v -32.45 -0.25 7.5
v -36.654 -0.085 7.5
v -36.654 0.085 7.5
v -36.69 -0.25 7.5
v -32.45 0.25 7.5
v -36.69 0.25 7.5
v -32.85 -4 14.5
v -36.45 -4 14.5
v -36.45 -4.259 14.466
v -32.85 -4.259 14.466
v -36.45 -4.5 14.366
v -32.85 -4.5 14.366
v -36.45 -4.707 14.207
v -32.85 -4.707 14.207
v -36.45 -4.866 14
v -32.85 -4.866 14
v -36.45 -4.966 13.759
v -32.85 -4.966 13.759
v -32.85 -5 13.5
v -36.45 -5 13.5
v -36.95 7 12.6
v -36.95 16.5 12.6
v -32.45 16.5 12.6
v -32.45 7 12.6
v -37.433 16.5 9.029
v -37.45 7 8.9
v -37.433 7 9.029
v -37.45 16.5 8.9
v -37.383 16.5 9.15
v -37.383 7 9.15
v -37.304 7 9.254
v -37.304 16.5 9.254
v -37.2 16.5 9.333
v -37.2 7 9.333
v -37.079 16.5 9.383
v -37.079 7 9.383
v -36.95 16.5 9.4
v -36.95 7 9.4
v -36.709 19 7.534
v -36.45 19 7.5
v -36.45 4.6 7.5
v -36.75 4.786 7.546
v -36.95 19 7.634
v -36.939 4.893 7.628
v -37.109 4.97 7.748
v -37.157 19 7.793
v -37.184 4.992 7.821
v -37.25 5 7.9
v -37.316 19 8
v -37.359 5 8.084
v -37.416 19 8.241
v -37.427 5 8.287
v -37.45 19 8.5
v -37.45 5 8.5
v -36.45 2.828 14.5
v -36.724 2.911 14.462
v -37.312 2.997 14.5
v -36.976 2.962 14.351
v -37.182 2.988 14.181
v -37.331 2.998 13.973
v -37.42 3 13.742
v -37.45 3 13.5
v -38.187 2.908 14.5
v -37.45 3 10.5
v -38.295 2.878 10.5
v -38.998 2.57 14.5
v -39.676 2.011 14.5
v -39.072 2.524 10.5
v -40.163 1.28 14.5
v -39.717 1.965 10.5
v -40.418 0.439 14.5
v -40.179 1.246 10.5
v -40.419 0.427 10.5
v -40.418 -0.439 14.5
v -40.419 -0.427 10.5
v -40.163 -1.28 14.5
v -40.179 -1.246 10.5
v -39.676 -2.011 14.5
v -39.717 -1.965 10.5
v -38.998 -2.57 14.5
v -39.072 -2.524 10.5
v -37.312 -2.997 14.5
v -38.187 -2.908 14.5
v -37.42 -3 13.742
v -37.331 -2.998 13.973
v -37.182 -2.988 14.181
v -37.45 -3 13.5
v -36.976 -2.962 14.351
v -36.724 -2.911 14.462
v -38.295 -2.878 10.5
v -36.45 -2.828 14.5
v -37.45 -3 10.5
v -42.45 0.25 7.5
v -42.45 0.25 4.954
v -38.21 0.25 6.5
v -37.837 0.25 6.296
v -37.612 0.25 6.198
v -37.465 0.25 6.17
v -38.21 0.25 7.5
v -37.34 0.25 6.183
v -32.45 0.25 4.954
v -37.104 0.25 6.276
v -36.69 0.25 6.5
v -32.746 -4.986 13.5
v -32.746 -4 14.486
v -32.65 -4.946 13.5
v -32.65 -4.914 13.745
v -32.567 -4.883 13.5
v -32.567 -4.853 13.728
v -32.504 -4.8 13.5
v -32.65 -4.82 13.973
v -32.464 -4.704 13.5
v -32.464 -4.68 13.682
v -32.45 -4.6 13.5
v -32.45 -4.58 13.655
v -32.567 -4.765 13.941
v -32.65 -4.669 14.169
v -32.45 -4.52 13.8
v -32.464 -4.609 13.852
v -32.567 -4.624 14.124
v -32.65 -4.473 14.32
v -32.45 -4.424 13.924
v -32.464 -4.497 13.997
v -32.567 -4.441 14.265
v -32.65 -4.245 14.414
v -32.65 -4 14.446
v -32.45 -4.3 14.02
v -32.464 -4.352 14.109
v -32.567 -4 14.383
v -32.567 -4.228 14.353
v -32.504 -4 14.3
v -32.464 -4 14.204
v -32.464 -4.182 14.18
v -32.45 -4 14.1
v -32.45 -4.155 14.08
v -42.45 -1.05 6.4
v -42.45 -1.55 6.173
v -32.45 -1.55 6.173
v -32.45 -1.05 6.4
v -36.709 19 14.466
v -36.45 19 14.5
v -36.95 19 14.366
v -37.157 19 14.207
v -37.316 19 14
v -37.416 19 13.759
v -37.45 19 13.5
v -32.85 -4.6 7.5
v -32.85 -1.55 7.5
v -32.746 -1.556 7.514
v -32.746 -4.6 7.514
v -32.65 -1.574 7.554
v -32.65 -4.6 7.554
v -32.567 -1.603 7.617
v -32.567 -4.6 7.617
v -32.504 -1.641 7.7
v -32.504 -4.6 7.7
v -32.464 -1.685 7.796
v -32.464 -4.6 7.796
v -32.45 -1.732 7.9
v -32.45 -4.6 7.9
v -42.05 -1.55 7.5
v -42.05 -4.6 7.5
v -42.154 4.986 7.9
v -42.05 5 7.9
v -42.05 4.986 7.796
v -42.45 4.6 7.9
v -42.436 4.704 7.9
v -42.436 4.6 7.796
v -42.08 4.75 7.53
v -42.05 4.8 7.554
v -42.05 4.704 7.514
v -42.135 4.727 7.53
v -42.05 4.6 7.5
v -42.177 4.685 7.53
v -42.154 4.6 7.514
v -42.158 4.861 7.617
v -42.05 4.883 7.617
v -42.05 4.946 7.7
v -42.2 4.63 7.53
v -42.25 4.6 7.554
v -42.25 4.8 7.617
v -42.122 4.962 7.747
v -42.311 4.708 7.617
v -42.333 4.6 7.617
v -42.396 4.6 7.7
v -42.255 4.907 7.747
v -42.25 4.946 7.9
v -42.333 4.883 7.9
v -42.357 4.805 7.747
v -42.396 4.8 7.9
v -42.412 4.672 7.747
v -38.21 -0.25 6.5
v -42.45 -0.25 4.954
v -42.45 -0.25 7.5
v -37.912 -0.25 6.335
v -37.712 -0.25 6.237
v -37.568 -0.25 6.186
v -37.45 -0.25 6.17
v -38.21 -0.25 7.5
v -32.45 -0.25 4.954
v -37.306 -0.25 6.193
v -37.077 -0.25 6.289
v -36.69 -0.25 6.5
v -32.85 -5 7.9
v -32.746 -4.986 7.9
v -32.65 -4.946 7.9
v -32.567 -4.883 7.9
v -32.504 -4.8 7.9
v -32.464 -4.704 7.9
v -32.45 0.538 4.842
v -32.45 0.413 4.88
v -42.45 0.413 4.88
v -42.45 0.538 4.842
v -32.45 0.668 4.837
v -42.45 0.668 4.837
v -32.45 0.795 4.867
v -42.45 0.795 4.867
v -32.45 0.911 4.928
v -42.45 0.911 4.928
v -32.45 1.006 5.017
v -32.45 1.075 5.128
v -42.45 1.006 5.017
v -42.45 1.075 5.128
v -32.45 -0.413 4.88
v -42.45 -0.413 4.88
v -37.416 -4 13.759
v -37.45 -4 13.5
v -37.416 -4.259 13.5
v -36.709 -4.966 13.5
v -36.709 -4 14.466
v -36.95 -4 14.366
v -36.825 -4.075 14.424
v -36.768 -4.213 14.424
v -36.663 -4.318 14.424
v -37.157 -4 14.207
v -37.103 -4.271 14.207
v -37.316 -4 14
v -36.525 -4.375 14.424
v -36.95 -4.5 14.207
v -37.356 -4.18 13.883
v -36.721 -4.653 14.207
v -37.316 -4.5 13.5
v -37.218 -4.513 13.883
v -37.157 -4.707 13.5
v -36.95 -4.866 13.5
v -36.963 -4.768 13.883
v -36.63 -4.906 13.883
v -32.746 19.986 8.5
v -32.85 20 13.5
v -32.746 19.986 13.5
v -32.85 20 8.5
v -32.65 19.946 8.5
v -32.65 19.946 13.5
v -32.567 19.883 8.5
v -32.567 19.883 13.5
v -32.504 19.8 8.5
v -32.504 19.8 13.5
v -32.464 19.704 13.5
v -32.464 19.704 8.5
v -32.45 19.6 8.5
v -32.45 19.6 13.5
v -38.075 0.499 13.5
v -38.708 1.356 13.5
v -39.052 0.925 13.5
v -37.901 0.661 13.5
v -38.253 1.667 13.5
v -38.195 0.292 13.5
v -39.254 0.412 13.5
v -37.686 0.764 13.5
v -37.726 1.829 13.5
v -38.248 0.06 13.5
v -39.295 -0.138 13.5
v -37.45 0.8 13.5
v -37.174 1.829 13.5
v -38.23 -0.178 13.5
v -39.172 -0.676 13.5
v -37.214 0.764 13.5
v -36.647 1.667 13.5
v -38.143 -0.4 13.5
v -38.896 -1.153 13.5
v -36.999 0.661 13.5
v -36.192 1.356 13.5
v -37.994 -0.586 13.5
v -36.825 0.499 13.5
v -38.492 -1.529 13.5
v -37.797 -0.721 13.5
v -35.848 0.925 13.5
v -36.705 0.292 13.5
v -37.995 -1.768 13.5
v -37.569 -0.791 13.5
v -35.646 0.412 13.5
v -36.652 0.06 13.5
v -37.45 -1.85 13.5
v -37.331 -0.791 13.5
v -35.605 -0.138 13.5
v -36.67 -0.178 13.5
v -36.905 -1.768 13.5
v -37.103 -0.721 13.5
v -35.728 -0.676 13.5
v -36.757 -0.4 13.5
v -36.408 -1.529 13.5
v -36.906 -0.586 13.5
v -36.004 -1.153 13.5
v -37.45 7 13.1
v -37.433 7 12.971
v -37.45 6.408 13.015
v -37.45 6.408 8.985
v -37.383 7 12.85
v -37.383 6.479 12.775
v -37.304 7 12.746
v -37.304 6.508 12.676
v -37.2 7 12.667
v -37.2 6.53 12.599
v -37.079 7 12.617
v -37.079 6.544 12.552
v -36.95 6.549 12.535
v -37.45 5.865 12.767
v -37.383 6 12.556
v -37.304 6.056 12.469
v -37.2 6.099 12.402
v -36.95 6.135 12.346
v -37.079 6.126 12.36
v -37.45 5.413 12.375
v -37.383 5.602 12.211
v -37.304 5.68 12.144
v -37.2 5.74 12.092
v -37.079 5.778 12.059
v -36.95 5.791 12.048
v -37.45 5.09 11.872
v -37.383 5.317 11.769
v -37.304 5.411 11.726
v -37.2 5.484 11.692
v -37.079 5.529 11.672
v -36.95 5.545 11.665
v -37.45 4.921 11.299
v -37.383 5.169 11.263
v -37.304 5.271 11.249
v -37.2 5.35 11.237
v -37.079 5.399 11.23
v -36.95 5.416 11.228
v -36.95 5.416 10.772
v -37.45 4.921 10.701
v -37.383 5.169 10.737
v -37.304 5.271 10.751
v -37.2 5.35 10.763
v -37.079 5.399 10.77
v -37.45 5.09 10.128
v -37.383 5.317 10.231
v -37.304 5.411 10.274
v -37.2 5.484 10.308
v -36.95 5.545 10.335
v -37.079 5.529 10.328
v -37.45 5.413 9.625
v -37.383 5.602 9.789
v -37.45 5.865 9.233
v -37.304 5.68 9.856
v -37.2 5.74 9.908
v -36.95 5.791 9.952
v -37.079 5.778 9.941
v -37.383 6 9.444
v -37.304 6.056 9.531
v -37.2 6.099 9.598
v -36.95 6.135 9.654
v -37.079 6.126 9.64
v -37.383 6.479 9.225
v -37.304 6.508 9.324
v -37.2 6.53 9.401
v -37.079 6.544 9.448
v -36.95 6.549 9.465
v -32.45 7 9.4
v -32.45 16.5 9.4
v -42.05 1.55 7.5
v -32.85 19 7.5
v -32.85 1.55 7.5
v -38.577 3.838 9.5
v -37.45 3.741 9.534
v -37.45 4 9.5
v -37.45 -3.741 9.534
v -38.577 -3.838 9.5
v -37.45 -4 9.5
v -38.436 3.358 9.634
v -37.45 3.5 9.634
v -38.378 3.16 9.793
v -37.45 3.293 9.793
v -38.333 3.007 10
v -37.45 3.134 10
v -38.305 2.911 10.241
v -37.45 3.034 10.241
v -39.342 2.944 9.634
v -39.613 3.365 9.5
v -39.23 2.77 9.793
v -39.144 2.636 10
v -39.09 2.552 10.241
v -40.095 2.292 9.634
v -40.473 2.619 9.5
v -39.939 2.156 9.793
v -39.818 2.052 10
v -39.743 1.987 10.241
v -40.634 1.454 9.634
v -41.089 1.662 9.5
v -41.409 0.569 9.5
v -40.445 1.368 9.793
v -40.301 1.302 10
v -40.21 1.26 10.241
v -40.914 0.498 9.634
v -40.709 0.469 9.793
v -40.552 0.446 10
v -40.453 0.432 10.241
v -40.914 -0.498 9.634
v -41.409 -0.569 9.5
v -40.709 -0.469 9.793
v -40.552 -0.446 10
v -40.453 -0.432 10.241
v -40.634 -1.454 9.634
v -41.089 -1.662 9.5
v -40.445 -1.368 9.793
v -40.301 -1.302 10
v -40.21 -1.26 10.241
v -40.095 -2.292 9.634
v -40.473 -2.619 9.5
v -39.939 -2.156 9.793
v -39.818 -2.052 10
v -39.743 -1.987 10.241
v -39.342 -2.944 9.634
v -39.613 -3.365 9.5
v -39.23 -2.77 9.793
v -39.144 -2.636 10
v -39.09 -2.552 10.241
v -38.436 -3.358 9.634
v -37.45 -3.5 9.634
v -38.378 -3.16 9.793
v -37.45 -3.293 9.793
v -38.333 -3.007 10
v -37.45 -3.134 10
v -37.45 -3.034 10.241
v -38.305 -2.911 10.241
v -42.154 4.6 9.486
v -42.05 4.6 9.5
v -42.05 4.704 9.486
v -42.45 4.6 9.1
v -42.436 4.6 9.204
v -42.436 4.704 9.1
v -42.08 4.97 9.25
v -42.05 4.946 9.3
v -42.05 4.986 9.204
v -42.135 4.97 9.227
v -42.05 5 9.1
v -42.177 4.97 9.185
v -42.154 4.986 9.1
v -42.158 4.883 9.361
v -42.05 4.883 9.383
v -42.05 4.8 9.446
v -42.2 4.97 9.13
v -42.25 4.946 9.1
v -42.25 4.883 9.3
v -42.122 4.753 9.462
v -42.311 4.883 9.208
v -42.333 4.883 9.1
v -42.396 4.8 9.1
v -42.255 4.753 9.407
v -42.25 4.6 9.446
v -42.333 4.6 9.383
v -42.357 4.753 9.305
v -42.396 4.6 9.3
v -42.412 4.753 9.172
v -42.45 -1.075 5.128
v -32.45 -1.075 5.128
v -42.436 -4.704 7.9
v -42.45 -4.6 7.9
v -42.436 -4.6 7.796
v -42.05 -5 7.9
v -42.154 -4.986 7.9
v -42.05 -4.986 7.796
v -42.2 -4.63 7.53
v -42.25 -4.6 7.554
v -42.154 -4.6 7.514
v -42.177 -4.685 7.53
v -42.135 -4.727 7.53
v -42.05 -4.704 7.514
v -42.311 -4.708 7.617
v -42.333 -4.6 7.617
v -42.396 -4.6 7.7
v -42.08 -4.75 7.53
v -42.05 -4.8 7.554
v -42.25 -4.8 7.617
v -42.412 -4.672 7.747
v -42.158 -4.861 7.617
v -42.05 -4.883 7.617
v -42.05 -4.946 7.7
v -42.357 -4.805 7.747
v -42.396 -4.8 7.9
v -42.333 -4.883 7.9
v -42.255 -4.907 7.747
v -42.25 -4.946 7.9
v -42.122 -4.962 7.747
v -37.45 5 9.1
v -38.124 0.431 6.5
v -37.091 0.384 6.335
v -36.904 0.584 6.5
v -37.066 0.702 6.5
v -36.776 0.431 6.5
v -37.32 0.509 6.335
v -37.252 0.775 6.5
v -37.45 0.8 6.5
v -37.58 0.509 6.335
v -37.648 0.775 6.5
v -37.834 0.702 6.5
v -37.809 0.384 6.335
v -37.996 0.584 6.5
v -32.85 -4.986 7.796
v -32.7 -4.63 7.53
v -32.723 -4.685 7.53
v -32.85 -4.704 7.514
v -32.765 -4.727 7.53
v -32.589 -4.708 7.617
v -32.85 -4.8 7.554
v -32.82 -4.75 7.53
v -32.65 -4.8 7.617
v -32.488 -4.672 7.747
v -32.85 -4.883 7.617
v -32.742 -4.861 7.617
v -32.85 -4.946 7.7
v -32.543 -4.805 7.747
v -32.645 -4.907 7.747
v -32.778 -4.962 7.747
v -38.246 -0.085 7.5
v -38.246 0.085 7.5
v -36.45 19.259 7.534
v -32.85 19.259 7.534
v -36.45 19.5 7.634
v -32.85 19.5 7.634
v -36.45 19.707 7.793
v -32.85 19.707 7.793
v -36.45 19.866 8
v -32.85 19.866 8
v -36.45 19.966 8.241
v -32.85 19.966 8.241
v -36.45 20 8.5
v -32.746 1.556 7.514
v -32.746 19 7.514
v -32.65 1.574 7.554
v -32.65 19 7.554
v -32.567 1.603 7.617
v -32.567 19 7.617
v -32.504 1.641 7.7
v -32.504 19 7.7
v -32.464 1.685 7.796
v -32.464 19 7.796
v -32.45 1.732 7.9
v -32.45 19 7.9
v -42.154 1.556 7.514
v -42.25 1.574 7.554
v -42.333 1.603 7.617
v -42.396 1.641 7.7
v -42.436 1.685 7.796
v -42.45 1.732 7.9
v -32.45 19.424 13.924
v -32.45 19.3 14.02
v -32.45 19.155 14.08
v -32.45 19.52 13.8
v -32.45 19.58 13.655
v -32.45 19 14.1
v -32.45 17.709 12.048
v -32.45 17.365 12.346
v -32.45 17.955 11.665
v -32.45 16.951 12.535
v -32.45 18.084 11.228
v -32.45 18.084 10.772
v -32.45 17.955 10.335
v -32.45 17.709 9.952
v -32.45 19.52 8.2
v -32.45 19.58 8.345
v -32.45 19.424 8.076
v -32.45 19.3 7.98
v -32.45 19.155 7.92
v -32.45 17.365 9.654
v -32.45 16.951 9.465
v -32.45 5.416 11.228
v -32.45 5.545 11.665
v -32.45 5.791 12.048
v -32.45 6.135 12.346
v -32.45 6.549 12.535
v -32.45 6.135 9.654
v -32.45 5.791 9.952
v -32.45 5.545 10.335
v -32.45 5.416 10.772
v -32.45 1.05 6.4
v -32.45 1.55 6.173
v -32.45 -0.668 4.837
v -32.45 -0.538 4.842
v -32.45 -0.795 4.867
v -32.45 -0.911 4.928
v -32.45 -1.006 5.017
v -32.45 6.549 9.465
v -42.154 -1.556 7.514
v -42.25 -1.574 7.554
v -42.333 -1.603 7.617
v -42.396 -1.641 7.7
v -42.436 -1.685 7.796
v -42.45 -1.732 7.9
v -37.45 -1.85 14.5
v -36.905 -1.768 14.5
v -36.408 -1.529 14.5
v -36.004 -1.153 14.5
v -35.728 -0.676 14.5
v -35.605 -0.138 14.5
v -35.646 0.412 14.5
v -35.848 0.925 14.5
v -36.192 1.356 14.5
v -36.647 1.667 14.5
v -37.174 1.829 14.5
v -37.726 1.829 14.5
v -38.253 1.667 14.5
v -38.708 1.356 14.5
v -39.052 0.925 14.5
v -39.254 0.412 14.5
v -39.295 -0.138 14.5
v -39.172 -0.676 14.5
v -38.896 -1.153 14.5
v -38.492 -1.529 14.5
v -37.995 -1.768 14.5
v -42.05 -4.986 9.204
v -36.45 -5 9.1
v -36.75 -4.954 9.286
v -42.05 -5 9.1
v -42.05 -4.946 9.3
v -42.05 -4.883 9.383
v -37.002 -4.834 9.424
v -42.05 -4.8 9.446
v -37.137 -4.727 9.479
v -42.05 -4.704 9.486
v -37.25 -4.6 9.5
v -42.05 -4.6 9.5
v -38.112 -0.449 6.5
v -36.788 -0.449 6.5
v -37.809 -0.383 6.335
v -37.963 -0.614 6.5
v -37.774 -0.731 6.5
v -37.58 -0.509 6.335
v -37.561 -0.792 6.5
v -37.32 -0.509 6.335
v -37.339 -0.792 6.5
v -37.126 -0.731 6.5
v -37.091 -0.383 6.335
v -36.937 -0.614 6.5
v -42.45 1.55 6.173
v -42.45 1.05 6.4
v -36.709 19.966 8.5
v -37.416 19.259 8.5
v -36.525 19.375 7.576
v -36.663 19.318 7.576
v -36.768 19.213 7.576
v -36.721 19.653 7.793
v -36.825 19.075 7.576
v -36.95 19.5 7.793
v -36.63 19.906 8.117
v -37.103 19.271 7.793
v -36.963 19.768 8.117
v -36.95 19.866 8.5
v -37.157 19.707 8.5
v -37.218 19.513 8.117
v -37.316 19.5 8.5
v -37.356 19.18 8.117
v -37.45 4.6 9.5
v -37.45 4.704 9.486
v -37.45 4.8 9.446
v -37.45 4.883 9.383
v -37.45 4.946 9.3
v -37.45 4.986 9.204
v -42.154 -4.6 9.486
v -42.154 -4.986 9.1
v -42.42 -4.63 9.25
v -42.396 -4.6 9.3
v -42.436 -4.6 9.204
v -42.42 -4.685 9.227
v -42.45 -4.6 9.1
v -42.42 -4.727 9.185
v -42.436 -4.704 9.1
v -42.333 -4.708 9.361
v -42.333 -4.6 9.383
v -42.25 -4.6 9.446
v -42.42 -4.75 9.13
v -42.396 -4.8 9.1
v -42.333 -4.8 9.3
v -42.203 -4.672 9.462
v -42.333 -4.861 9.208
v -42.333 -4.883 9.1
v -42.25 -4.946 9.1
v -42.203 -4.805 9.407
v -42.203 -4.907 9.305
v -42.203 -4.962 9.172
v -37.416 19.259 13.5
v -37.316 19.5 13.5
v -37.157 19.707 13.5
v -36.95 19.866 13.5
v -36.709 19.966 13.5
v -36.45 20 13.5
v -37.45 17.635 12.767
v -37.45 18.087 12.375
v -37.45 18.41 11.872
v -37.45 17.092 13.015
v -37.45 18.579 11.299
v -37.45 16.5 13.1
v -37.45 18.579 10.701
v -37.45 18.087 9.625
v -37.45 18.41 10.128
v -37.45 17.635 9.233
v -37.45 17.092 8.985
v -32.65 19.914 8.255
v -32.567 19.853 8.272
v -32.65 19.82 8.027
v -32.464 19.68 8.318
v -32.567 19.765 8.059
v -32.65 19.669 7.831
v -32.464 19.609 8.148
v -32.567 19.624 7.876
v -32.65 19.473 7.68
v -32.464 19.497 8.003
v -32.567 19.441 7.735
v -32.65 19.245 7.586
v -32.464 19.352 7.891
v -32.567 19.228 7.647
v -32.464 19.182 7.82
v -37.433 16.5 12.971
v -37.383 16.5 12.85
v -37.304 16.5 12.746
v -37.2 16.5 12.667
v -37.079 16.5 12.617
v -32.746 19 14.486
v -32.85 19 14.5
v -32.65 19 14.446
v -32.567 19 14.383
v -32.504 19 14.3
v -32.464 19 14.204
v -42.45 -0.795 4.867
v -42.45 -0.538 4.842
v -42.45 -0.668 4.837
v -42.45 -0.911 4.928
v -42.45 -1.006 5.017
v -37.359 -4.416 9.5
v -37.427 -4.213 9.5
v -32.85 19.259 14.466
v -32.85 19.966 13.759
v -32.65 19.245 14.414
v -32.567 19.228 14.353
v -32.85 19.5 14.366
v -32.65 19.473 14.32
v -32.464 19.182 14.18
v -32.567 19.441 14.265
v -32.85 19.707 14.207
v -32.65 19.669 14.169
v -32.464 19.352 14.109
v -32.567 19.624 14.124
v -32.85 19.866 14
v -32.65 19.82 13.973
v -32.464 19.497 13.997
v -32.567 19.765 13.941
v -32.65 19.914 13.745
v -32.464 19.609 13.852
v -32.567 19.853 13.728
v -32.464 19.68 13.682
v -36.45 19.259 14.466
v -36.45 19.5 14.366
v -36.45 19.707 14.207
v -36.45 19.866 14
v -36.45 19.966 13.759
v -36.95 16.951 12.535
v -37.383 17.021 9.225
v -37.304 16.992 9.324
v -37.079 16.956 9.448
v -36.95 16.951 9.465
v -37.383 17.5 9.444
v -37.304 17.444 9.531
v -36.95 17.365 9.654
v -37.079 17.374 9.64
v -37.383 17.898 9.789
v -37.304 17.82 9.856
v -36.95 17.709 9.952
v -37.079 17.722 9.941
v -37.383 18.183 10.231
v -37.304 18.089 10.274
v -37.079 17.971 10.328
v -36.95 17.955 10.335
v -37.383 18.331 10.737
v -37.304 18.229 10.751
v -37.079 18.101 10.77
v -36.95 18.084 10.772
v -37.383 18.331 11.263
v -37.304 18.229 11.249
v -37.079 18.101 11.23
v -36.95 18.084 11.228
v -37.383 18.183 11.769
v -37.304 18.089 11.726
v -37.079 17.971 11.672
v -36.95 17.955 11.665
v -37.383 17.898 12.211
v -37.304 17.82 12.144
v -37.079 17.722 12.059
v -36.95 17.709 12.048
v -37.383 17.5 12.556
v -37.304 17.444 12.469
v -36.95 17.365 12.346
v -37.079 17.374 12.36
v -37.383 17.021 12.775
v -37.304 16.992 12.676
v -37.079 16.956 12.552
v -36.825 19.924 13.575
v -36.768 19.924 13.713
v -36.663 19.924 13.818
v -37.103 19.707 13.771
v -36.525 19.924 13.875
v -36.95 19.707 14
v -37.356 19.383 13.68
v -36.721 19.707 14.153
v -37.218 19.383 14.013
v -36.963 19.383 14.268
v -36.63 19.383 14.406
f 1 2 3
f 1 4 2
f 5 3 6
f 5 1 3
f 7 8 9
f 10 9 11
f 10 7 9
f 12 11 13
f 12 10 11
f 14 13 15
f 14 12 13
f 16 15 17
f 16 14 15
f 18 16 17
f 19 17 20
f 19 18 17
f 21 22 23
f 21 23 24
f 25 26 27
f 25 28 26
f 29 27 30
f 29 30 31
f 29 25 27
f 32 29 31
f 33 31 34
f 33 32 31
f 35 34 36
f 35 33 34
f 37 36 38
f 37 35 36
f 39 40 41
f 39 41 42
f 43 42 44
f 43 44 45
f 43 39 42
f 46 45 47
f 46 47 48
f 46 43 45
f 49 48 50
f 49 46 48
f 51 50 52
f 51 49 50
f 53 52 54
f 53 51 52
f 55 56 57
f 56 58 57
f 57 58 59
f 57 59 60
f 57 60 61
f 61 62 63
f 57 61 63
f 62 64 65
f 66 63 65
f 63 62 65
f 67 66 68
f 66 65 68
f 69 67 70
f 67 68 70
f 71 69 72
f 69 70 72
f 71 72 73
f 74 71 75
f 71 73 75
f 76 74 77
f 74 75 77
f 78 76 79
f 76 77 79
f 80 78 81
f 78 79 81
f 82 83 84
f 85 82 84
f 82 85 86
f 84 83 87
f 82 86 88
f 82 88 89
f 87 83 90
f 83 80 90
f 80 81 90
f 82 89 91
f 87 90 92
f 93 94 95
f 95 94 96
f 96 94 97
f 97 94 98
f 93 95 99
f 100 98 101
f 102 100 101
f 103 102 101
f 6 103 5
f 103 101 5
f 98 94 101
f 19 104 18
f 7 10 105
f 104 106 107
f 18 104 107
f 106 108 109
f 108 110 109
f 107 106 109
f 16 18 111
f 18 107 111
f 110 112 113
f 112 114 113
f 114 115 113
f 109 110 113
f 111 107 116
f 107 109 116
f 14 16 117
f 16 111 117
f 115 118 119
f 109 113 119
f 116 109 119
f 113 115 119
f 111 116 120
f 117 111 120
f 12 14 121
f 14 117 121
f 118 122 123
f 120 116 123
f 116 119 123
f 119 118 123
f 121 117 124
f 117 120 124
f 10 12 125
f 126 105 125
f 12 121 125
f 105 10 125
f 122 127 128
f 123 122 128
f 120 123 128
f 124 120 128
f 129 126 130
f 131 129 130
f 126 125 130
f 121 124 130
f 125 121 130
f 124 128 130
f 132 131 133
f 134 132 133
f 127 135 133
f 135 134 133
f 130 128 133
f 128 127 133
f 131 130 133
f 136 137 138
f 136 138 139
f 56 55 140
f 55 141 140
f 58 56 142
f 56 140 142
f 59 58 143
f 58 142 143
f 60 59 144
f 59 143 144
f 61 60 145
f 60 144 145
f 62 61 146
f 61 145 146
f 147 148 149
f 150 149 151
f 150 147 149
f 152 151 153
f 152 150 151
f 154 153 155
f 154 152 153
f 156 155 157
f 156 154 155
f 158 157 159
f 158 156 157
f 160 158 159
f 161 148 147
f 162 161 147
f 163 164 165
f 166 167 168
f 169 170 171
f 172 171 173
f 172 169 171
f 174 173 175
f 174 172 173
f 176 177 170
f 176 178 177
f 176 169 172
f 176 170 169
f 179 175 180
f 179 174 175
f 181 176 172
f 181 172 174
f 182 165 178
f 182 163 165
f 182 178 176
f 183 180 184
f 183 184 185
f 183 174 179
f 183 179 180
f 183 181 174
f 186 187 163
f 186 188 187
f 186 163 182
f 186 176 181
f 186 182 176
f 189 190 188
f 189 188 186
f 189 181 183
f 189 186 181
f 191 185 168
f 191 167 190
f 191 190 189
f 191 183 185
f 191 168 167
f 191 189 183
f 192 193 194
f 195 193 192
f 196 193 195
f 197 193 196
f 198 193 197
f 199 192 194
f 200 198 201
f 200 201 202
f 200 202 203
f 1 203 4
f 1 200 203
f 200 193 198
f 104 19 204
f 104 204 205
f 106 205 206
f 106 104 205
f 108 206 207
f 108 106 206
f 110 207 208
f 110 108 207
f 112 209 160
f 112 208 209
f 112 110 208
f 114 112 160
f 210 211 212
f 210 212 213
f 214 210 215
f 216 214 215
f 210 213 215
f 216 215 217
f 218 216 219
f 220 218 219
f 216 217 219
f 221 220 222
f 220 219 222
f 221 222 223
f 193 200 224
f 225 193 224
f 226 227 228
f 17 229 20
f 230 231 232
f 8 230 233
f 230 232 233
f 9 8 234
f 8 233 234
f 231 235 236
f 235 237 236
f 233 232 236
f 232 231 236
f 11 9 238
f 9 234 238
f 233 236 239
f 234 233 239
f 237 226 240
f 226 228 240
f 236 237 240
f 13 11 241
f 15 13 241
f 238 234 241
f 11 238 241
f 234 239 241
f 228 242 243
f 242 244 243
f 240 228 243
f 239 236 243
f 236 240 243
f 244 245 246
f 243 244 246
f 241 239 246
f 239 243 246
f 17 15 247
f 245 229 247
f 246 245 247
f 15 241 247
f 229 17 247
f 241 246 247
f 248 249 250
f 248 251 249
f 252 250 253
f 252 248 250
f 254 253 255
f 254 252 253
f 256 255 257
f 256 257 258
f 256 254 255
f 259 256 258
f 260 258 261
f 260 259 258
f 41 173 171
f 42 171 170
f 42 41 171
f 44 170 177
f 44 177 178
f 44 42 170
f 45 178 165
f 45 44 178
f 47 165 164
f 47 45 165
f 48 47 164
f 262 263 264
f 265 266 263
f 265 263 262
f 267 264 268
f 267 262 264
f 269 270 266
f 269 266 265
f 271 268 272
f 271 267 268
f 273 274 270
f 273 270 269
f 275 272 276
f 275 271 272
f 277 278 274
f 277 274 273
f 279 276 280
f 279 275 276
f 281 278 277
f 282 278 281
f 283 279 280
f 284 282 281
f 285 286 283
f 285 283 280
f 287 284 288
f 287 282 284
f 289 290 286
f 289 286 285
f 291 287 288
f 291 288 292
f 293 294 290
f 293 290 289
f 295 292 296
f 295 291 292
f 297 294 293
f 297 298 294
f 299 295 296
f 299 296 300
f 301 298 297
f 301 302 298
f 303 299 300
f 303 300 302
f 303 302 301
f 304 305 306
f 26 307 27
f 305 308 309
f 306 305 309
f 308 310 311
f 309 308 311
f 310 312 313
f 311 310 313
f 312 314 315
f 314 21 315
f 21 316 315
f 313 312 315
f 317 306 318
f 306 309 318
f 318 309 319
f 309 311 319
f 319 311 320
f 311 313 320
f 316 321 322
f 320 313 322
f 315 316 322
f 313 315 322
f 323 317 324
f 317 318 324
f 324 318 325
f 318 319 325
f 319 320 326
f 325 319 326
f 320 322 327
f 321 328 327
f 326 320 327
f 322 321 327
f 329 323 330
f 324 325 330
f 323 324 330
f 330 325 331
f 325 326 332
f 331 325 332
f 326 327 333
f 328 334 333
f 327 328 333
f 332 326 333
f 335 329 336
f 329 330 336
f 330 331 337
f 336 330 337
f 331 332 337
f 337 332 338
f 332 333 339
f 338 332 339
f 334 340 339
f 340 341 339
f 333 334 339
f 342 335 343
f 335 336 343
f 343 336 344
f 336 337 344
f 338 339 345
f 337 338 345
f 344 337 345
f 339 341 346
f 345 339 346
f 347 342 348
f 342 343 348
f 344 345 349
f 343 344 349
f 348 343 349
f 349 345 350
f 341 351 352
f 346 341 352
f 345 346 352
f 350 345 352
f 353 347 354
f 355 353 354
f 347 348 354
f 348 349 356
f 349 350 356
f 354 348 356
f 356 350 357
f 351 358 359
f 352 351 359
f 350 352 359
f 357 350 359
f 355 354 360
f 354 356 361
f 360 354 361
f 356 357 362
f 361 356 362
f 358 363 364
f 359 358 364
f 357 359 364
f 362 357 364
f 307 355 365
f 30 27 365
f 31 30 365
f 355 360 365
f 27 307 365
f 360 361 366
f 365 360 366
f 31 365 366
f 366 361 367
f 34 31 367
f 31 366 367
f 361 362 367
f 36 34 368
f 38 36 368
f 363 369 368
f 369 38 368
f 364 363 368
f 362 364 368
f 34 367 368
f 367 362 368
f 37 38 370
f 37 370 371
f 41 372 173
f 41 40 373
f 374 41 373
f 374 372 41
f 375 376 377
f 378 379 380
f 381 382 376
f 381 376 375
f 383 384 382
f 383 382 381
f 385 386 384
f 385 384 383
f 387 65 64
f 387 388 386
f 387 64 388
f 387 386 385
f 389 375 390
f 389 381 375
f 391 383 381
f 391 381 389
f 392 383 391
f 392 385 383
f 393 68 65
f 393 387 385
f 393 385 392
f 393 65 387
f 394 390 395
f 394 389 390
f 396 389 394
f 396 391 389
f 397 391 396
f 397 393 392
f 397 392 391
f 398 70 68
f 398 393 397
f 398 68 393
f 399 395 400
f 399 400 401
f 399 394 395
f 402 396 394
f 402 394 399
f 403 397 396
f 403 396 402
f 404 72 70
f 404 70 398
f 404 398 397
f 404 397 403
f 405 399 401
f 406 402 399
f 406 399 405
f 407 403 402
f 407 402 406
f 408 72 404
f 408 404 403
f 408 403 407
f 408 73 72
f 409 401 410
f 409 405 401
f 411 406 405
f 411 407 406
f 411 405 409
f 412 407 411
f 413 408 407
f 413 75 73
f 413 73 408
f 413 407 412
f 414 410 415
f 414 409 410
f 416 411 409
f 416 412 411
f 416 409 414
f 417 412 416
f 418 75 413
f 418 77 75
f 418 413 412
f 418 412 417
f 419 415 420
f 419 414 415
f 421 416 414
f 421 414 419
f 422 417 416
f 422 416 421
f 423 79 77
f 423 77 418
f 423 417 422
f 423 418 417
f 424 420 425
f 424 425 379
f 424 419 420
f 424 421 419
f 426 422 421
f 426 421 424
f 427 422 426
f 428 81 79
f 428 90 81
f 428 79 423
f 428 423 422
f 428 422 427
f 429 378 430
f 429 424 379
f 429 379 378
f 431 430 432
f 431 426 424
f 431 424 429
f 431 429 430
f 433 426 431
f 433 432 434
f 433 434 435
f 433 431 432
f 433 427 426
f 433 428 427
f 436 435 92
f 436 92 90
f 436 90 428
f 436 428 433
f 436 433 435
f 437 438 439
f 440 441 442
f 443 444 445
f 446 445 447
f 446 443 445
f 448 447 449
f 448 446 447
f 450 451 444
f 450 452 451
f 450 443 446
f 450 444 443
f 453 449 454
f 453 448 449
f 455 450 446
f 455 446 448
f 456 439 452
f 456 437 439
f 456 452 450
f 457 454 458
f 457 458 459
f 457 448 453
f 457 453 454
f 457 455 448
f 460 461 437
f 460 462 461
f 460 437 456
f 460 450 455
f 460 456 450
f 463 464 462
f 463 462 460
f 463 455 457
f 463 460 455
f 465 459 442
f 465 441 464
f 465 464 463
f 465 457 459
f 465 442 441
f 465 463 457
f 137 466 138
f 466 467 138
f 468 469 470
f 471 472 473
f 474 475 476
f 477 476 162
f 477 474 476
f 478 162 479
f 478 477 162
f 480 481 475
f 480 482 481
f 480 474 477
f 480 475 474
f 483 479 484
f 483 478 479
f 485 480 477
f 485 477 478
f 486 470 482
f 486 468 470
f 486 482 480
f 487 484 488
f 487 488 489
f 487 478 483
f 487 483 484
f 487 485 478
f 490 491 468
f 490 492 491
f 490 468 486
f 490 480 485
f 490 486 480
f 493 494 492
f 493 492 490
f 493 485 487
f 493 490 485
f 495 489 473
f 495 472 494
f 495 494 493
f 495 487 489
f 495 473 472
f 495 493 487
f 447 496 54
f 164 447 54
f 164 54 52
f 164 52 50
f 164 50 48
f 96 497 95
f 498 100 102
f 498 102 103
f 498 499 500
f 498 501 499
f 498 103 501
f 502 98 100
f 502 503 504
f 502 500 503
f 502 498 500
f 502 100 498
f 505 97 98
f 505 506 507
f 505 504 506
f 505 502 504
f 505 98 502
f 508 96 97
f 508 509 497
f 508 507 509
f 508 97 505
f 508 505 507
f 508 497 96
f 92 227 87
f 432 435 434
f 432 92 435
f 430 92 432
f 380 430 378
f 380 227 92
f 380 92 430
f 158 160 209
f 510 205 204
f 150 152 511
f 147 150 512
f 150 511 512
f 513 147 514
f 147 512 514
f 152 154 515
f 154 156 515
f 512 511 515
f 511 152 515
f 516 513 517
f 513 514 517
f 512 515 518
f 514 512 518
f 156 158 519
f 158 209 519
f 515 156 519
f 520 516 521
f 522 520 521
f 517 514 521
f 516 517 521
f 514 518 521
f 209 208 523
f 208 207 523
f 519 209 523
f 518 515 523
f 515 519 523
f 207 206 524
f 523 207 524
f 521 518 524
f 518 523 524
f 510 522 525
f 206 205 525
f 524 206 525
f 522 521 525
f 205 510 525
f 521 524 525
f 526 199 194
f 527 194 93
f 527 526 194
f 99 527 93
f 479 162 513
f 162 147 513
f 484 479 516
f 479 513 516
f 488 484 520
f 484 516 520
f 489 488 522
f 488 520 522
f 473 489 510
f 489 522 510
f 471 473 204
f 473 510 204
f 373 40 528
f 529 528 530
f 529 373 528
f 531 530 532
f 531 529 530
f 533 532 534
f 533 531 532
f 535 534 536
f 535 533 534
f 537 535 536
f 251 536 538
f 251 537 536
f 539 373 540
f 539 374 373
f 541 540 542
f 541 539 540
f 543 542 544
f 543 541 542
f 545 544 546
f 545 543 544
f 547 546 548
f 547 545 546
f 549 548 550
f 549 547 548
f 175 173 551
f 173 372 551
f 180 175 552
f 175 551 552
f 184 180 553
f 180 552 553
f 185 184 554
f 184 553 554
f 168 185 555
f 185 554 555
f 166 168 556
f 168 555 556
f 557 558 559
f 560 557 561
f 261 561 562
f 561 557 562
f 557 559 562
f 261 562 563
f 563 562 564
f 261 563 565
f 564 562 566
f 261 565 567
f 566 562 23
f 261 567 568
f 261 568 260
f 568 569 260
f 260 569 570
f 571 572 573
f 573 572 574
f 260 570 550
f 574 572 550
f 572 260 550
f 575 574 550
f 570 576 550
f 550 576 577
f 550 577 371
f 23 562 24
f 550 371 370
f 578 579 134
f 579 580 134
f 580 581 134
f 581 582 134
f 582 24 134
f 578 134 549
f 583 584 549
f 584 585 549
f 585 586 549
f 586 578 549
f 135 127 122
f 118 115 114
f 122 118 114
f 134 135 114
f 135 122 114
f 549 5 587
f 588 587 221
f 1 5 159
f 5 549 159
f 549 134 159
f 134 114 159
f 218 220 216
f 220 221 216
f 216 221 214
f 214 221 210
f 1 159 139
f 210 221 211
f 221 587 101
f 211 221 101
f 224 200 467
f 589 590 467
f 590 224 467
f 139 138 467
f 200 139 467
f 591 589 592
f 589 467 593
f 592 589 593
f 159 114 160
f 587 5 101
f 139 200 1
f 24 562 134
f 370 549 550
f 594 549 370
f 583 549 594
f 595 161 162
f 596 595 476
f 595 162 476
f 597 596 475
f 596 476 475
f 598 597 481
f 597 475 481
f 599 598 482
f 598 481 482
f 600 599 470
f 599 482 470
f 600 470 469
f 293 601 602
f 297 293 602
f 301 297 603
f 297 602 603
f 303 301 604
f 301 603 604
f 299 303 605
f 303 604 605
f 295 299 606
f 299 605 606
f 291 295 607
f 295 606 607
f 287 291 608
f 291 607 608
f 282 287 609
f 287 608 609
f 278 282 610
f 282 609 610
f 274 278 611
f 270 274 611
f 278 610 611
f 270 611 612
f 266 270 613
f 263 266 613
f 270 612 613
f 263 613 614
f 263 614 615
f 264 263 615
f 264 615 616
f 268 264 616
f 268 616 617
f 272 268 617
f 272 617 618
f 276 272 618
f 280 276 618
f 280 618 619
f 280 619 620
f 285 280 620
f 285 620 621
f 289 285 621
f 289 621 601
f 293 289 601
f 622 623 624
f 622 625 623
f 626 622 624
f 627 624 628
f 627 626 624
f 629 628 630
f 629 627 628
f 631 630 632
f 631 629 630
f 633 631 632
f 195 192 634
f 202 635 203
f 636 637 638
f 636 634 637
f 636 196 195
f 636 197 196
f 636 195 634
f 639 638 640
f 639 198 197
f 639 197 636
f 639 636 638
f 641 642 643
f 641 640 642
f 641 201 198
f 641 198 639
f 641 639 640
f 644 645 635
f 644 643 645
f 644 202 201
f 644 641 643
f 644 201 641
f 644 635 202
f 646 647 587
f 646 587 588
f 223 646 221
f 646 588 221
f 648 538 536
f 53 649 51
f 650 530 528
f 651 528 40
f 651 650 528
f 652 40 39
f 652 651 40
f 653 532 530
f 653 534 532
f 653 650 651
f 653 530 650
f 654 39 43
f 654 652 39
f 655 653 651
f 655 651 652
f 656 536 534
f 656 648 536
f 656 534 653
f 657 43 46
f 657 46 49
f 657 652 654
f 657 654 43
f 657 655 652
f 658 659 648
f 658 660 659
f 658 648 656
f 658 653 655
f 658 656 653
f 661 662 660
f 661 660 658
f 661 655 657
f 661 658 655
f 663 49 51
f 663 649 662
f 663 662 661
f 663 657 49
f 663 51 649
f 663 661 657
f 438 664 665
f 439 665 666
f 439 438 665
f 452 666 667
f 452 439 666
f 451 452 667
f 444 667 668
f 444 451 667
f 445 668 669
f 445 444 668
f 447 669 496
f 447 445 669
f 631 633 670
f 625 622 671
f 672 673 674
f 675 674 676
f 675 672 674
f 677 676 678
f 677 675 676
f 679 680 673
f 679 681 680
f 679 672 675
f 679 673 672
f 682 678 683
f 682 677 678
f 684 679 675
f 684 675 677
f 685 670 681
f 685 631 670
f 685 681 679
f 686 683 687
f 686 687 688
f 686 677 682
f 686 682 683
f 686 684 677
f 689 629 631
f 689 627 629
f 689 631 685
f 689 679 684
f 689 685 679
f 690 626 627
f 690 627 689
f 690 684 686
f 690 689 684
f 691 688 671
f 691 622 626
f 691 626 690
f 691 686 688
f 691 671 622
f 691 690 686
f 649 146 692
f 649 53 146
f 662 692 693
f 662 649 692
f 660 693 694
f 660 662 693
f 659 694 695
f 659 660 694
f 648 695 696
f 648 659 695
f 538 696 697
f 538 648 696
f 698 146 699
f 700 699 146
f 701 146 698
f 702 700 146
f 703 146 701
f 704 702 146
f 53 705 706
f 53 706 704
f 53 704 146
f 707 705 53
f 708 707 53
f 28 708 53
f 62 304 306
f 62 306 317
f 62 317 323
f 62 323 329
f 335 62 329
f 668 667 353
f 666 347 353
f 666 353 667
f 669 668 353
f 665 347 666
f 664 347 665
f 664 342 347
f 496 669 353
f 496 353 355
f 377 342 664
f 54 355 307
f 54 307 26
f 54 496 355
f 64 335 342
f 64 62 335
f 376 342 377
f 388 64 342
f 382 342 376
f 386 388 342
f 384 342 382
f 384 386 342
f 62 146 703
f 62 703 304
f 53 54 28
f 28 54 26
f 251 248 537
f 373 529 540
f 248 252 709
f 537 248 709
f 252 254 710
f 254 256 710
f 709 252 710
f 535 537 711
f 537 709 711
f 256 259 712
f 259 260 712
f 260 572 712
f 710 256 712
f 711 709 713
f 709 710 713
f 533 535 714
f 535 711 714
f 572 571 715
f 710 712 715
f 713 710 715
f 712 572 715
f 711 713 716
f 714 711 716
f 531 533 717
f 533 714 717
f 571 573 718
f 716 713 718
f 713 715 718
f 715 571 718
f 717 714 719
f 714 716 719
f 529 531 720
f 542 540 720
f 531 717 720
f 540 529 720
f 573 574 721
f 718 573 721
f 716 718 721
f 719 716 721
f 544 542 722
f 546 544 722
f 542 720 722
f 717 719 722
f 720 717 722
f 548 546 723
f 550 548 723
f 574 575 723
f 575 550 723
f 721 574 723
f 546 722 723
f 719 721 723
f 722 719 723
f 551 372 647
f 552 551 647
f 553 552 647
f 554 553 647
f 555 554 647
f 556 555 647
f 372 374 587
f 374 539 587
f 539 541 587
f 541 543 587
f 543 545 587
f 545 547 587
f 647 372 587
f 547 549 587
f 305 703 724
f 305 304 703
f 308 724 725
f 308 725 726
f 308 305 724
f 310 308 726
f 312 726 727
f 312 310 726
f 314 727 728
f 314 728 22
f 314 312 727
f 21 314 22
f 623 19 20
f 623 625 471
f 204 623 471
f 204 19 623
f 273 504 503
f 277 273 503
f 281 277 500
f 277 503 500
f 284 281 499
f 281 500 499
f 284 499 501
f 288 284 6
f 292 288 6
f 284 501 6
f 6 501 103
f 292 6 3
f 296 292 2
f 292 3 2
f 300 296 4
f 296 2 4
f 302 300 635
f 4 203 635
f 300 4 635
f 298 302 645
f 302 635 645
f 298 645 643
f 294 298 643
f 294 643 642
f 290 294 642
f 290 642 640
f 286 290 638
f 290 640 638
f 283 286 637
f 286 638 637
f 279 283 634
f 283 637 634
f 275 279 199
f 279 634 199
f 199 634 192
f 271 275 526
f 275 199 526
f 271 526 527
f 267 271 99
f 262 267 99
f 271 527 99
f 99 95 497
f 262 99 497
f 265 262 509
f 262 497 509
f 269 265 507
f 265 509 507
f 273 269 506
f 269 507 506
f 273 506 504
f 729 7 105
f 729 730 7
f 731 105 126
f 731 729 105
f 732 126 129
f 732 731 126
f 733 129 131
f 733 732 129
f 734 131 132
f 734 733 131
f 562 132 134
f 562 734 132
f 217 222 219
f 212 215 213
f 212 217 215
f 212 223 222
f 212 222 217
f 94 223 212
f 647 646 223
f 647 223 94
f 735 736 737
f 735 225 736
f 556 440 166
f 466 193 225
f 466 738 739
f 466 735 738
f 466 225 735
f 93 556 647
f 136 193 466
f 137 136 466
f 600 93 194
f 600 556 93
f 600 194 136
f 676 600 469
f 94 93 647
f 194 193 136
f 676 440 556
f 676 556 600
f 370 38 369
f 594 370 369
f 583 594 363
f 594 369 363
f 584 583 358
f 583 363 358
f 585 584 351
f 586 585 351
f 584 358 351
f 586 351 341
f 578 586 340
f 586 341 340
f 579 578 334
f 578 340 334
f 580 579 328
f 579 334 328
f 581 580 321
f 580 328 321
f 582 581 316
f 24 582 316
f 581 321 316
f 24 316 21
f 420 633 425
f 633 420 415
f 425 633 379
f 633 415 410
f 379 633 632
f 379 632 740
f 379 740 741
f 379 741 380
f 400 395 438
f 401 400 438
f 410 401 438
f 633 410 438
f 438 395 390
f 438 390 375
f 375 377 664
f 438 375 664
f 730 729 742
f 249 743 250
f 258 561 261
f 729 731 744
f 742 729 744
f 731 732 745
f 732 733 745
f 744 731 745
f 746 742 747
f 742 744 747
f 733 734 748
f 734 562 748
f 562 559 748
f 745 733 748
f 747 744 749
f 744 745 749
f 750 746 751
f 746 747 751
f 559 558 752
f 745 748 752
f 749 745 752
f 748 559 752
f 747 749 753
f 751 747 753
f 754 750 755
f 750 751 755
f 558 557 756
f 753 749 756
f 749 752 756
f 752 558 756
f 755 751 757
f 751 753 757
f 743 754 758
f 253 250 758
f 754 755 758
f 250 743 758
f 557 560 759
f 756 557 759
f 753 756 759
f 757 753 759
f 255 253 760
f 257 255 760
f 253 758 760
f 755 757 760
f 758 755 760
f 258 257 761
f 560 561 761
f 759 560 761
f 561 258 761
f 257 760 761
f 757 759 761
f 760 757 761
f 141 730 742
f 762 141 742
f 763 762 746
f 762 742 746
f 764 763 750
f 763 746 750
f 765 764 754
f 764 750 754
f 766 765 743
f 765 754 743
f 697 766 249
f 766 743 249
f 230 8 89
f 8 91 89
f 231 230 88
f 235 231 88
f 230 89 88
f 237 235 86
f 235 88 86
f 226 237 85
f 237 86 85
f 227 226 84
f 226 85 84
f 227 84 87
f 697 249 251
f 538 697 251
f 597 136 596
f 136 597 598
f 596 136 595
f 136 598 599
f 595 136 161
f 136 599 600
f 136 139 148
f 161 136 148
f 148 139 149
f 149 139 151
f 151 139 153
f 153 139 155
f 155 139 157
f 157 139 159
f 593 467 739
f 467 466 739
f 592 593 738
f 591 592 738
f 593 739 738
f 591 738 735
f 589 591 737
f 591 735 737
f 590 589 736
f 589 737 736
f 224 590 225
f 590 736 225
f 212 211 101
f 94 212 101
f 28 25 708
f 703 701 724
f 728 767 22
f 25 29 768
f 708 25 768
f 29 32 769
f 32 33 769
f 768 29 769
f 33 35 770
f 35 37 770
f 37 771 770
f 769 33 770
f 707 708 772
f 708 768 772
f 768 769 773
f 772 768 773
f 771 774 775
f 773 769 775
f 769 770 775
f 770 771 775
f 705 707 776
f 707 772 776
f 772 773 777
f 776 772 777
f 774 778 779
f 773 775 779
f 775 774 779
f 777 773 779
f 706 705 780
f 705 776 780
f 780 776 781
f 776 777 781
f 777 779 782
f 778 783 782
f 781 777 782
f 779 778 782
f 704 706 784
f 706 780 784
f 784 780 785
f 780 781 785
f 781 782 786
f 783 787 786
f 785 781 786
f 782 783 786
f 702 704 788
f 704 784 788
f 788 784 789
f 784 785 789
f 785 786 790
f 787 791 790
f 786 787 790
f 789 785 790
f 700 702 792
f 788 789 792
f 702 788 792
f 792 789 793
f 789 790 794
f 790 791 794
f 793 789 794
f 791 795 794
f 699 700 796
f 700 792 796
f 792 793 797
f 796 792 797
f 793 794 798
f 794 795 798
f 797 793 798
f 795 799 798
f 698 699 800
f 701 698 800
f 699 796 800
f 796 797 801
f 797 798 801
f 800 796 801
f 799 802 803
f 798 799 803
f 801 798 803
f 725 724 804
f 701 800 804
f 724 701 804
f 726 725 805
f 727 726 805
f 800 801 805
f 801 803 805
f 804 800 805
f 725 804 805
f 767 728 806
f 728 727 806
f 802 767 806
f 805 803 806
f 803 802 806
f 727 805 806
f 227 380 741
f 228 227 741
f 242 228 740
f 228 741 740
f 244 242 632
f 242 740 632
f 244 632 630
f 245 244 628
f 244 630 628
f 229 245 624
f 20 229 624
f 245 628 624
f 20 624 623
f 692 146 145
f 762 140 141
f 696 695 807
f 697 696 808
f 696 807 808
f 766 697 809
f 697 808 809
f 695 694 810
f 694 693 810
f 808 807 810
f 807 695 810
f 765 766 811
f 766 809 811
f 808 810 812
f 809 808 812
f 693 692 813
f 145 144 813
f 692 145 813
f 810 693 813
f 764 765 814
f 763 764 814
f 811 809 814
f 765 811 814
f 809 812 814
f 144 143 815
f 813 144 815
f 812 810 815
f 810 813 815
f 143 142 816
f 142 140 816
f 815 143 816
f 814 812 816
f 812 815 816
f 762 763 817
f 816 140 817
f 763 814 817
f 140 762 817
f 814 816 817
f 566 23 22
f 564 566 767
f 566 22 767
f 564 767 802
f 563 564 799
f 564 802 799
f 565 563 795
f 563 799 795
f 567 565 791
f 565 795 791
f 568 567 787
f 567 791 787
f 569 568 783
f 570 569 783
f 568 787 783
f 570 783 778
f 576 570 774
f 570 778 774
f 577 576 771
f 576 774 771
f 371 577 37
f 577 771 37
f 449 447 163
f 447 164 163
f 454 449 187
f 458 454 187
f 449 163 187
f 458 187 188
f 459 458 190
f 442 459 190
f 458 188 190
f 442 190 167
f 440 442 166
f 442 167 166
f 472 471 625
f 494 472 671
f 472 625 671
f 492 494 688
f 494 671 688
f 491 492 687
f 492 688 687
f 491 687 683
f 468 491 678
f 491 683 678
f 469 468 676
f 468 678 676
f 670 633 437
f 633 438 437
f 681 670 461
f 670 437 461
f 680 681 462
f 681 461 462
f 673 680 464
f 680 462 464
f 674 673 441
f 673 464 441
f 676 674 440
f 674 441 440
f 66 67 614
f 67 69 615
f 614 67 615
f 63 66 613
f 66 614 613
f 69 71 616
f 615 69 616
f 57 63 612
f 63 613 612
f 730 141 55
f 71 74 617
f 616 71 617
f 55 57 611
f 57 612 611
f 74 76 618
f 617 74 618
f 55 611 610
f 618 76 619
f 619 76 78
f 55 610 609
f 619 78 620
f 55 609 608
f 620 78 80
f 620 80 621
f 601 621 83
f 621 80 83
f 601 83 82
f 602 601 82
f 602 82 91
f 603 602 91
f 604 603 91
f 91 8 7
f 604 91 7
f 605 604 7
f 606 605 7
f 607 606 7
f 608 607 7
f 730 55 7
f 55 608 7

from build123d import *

# Parameters (mm, degrees)
PAD_DEPTH           = 5
SKETCH002_W         = 0.5
SKETCH002_H         = 2.8
POCKET_DEPTH        = 10.001
FILLET_R            = 0.5
SKETCH024_R         = 3
PAD016_DEPTH        = 5
FILLET004_R         = 1
SKETCH025_W         = 7
SKETCH025_H         = 5
PAD017_DEPTH        = 25
HOLE004_D           = 1.6
HOLE004_DEPTH       = 8
HOLE004_CBORE_D     = 3.7
HOLE004_CBORE_DEPTH = 1
HOLE004_TIPS_R      = 0.8
FILLET005_R         = 1
FILLET006_R         = 0.4
POCKET010_DEPTH     = 5.001
FILLET009_R         = 0.5


with BuildPart() as part:
    # Sketch → Pad (new body, symmetric)
    with BuildSketch(Plane.YZ):
        Polygon((-5, 7.5), (-5, 9.5), (5, 9.5), (5, 7.5), (1.55, 7.5), (1.05, 6.4), (1.55, 6.172727), (0.868182, 4.672727), (0, 5.067355), (-0.868182, 4.672727), (-1.55, 6.172727), (-1.05, 6.4), (-1.55, 7.5), align=None)
    extrude(amount=PAD_DEPTH, both=True)

    # Sketch002 → Pocket (cut, through all)
    with BuildSketch(Plane.YZ.offset(5)):
        with Locations((0, 6.1)):
            Rectangle(SKETCH002_W, SKETCH002_H)
    extrude(amount=-POCKET_DEPTH, mode=Mode.SUBTRACT)

    # Fillet
    fillet_edges = [part.edges().sort_by_distance(p)[0] for p in [
        (0, 0.868182, 4.672727),
        (0, -0.868182, 4.672727),
    ]]
    fillet(fillet_edges, radius=FILLET_R)

    # Sketch024 (on Face2 of Pad) → Pad016 (join)
    with BuildSketch(Plane(origin=(0, 0, 9.5), x_dir=(0, -1, 0), z_dir=(0, 0, 1))):
        Circle(SKETCH024_R)
    extrude(amount=PAD016_DEPTH)

    # Fillet004
    fillet004_edges = [part.edges().sort_by_distance(p)[0] for p in [
        (0, 3, 9.5),
    ]]
    fillet(fillet004_edges, radius=FILLET004_R)

    # Sketch025 (on DatumPlane) → Pad017 (join)
    with BuildSketch(Plane(origin=(0, -5, 0), x_dir=(0, 0, -1), z_dir=(0, -1, 0))):
        with Locations((-11, 2.5)):
            Rectangle(SKETCH025_W, SKETCH025_H)
    extrude(amount=-PAD017_DEPTH)

    # Hole004
    with Locations(Plane(origin=(0, 0, 14.5), x_dir=(0, -1, 0), z_dir=(0, 0, 1))):
        with Locations((0, 0)):
            CounterBoreHole(HOLE004_D / 2, HOLE004_CBORE_D / 2, HOLE004_CBORE_DEPTH, depth=HOLE004_DEPTH)

    # Hole004 tips → Hole004 tip 1 section 0
    with BuildSketch(Plane(origin=(0, 0, 6.5), x_dir=(0, -1, 0), z_dir=(0, 0, 1)), mode=Mode.PRIVATE) as hole004_tip_1_s0:
        Circle(HOLE004_TIPS_R)
    loft([hole004_tip_1_s0.sketch, Vertex(0, 0, 6.019312)], mode=Mode.SUBTRACT)

    # Fillet005
    fillet005_edges = [part.edges().sort_by_distance(p)[0] for p in [
        (0, -5, 12),
        (0, -4, 14.5),
        (0, 11.5, 14.5),
        (0, 20, 11),
        (2.5, 20, 7.5),
        (0, 12.5, 7.5),
        (2.5, -5, 14.5),
        (2.5, 20, 14.5),
    ]]
    fillet(fillet005_edges, radius=FILLET005_R)

    # Fillet006
    fillet006_edges = [part.edges().sort_by_distance(p)[0] for p in [
        (-2.5, -5, 9.5),
        (-5, 0, 9.5),
        (-2.5, 5, 9.5),
        (0.5, -5, 9.5),
        (-5, 5, 8.5),
        (-5, -5, 8.5),
        (5, 7.5, 14.5),
        (5, 19.707107, 14.207107),
        (5, 20, 11),
        (5, 19.707107, 7.792893),
        (5, 10.275, 7.5),
        (5, -5, 10.5),
        (5, -4.707107, 14.207107),
        (5, -3.275, 7.5),
        (-2.5, 5, 7.5),
        (0.5, 5, 7.5),
        (-5, 3.275, 7.5),
        (-5, -3.275, 7.5),
        (0, -5, 7.5),
    ]]
    fillet(fillet006_edges, radius=FILLET006_R)

    # Sketch027 (on DatumPlane) → Pocket010 (cut, through all)
    with BuildSketch(Plane(origin=(0, 0, 0), x_dir=(0, 1, 0), z_dir=(-1, 0, 0))):
        with BuildLine():
            Line((7, -9.4), (16.5, -9.4))
            ThreePointArc((16.5, -12.6), (18.1, -11), (16.5, -9.4))
            Line((16.5, -12.6), (7, -12.6))
            ThreePointArc((7, -9.4), (5.4, -11), (7, -12.6))
        make_face()
    extrude(amount=-POCKET010_DEPTH, mode=Mode.SUBTRACT)

    # Fillet009
    fillet009_edges = [part.edges().sort_by_distance(p)[0] for p in [
        (0, 11.75, 12.6),
        (0, 18.1, 11),
        (0, 11.75, 9.4),
        (0, 5.4, 11),
    ]]
    fillet(fillet009_edges, radius=FILLET009_R)


with BuildPart() as part_1:
    # Body001 placement: moved
    add(part.part.moved(Location((-37.45, 0, 0))))


solid = part_1.part
